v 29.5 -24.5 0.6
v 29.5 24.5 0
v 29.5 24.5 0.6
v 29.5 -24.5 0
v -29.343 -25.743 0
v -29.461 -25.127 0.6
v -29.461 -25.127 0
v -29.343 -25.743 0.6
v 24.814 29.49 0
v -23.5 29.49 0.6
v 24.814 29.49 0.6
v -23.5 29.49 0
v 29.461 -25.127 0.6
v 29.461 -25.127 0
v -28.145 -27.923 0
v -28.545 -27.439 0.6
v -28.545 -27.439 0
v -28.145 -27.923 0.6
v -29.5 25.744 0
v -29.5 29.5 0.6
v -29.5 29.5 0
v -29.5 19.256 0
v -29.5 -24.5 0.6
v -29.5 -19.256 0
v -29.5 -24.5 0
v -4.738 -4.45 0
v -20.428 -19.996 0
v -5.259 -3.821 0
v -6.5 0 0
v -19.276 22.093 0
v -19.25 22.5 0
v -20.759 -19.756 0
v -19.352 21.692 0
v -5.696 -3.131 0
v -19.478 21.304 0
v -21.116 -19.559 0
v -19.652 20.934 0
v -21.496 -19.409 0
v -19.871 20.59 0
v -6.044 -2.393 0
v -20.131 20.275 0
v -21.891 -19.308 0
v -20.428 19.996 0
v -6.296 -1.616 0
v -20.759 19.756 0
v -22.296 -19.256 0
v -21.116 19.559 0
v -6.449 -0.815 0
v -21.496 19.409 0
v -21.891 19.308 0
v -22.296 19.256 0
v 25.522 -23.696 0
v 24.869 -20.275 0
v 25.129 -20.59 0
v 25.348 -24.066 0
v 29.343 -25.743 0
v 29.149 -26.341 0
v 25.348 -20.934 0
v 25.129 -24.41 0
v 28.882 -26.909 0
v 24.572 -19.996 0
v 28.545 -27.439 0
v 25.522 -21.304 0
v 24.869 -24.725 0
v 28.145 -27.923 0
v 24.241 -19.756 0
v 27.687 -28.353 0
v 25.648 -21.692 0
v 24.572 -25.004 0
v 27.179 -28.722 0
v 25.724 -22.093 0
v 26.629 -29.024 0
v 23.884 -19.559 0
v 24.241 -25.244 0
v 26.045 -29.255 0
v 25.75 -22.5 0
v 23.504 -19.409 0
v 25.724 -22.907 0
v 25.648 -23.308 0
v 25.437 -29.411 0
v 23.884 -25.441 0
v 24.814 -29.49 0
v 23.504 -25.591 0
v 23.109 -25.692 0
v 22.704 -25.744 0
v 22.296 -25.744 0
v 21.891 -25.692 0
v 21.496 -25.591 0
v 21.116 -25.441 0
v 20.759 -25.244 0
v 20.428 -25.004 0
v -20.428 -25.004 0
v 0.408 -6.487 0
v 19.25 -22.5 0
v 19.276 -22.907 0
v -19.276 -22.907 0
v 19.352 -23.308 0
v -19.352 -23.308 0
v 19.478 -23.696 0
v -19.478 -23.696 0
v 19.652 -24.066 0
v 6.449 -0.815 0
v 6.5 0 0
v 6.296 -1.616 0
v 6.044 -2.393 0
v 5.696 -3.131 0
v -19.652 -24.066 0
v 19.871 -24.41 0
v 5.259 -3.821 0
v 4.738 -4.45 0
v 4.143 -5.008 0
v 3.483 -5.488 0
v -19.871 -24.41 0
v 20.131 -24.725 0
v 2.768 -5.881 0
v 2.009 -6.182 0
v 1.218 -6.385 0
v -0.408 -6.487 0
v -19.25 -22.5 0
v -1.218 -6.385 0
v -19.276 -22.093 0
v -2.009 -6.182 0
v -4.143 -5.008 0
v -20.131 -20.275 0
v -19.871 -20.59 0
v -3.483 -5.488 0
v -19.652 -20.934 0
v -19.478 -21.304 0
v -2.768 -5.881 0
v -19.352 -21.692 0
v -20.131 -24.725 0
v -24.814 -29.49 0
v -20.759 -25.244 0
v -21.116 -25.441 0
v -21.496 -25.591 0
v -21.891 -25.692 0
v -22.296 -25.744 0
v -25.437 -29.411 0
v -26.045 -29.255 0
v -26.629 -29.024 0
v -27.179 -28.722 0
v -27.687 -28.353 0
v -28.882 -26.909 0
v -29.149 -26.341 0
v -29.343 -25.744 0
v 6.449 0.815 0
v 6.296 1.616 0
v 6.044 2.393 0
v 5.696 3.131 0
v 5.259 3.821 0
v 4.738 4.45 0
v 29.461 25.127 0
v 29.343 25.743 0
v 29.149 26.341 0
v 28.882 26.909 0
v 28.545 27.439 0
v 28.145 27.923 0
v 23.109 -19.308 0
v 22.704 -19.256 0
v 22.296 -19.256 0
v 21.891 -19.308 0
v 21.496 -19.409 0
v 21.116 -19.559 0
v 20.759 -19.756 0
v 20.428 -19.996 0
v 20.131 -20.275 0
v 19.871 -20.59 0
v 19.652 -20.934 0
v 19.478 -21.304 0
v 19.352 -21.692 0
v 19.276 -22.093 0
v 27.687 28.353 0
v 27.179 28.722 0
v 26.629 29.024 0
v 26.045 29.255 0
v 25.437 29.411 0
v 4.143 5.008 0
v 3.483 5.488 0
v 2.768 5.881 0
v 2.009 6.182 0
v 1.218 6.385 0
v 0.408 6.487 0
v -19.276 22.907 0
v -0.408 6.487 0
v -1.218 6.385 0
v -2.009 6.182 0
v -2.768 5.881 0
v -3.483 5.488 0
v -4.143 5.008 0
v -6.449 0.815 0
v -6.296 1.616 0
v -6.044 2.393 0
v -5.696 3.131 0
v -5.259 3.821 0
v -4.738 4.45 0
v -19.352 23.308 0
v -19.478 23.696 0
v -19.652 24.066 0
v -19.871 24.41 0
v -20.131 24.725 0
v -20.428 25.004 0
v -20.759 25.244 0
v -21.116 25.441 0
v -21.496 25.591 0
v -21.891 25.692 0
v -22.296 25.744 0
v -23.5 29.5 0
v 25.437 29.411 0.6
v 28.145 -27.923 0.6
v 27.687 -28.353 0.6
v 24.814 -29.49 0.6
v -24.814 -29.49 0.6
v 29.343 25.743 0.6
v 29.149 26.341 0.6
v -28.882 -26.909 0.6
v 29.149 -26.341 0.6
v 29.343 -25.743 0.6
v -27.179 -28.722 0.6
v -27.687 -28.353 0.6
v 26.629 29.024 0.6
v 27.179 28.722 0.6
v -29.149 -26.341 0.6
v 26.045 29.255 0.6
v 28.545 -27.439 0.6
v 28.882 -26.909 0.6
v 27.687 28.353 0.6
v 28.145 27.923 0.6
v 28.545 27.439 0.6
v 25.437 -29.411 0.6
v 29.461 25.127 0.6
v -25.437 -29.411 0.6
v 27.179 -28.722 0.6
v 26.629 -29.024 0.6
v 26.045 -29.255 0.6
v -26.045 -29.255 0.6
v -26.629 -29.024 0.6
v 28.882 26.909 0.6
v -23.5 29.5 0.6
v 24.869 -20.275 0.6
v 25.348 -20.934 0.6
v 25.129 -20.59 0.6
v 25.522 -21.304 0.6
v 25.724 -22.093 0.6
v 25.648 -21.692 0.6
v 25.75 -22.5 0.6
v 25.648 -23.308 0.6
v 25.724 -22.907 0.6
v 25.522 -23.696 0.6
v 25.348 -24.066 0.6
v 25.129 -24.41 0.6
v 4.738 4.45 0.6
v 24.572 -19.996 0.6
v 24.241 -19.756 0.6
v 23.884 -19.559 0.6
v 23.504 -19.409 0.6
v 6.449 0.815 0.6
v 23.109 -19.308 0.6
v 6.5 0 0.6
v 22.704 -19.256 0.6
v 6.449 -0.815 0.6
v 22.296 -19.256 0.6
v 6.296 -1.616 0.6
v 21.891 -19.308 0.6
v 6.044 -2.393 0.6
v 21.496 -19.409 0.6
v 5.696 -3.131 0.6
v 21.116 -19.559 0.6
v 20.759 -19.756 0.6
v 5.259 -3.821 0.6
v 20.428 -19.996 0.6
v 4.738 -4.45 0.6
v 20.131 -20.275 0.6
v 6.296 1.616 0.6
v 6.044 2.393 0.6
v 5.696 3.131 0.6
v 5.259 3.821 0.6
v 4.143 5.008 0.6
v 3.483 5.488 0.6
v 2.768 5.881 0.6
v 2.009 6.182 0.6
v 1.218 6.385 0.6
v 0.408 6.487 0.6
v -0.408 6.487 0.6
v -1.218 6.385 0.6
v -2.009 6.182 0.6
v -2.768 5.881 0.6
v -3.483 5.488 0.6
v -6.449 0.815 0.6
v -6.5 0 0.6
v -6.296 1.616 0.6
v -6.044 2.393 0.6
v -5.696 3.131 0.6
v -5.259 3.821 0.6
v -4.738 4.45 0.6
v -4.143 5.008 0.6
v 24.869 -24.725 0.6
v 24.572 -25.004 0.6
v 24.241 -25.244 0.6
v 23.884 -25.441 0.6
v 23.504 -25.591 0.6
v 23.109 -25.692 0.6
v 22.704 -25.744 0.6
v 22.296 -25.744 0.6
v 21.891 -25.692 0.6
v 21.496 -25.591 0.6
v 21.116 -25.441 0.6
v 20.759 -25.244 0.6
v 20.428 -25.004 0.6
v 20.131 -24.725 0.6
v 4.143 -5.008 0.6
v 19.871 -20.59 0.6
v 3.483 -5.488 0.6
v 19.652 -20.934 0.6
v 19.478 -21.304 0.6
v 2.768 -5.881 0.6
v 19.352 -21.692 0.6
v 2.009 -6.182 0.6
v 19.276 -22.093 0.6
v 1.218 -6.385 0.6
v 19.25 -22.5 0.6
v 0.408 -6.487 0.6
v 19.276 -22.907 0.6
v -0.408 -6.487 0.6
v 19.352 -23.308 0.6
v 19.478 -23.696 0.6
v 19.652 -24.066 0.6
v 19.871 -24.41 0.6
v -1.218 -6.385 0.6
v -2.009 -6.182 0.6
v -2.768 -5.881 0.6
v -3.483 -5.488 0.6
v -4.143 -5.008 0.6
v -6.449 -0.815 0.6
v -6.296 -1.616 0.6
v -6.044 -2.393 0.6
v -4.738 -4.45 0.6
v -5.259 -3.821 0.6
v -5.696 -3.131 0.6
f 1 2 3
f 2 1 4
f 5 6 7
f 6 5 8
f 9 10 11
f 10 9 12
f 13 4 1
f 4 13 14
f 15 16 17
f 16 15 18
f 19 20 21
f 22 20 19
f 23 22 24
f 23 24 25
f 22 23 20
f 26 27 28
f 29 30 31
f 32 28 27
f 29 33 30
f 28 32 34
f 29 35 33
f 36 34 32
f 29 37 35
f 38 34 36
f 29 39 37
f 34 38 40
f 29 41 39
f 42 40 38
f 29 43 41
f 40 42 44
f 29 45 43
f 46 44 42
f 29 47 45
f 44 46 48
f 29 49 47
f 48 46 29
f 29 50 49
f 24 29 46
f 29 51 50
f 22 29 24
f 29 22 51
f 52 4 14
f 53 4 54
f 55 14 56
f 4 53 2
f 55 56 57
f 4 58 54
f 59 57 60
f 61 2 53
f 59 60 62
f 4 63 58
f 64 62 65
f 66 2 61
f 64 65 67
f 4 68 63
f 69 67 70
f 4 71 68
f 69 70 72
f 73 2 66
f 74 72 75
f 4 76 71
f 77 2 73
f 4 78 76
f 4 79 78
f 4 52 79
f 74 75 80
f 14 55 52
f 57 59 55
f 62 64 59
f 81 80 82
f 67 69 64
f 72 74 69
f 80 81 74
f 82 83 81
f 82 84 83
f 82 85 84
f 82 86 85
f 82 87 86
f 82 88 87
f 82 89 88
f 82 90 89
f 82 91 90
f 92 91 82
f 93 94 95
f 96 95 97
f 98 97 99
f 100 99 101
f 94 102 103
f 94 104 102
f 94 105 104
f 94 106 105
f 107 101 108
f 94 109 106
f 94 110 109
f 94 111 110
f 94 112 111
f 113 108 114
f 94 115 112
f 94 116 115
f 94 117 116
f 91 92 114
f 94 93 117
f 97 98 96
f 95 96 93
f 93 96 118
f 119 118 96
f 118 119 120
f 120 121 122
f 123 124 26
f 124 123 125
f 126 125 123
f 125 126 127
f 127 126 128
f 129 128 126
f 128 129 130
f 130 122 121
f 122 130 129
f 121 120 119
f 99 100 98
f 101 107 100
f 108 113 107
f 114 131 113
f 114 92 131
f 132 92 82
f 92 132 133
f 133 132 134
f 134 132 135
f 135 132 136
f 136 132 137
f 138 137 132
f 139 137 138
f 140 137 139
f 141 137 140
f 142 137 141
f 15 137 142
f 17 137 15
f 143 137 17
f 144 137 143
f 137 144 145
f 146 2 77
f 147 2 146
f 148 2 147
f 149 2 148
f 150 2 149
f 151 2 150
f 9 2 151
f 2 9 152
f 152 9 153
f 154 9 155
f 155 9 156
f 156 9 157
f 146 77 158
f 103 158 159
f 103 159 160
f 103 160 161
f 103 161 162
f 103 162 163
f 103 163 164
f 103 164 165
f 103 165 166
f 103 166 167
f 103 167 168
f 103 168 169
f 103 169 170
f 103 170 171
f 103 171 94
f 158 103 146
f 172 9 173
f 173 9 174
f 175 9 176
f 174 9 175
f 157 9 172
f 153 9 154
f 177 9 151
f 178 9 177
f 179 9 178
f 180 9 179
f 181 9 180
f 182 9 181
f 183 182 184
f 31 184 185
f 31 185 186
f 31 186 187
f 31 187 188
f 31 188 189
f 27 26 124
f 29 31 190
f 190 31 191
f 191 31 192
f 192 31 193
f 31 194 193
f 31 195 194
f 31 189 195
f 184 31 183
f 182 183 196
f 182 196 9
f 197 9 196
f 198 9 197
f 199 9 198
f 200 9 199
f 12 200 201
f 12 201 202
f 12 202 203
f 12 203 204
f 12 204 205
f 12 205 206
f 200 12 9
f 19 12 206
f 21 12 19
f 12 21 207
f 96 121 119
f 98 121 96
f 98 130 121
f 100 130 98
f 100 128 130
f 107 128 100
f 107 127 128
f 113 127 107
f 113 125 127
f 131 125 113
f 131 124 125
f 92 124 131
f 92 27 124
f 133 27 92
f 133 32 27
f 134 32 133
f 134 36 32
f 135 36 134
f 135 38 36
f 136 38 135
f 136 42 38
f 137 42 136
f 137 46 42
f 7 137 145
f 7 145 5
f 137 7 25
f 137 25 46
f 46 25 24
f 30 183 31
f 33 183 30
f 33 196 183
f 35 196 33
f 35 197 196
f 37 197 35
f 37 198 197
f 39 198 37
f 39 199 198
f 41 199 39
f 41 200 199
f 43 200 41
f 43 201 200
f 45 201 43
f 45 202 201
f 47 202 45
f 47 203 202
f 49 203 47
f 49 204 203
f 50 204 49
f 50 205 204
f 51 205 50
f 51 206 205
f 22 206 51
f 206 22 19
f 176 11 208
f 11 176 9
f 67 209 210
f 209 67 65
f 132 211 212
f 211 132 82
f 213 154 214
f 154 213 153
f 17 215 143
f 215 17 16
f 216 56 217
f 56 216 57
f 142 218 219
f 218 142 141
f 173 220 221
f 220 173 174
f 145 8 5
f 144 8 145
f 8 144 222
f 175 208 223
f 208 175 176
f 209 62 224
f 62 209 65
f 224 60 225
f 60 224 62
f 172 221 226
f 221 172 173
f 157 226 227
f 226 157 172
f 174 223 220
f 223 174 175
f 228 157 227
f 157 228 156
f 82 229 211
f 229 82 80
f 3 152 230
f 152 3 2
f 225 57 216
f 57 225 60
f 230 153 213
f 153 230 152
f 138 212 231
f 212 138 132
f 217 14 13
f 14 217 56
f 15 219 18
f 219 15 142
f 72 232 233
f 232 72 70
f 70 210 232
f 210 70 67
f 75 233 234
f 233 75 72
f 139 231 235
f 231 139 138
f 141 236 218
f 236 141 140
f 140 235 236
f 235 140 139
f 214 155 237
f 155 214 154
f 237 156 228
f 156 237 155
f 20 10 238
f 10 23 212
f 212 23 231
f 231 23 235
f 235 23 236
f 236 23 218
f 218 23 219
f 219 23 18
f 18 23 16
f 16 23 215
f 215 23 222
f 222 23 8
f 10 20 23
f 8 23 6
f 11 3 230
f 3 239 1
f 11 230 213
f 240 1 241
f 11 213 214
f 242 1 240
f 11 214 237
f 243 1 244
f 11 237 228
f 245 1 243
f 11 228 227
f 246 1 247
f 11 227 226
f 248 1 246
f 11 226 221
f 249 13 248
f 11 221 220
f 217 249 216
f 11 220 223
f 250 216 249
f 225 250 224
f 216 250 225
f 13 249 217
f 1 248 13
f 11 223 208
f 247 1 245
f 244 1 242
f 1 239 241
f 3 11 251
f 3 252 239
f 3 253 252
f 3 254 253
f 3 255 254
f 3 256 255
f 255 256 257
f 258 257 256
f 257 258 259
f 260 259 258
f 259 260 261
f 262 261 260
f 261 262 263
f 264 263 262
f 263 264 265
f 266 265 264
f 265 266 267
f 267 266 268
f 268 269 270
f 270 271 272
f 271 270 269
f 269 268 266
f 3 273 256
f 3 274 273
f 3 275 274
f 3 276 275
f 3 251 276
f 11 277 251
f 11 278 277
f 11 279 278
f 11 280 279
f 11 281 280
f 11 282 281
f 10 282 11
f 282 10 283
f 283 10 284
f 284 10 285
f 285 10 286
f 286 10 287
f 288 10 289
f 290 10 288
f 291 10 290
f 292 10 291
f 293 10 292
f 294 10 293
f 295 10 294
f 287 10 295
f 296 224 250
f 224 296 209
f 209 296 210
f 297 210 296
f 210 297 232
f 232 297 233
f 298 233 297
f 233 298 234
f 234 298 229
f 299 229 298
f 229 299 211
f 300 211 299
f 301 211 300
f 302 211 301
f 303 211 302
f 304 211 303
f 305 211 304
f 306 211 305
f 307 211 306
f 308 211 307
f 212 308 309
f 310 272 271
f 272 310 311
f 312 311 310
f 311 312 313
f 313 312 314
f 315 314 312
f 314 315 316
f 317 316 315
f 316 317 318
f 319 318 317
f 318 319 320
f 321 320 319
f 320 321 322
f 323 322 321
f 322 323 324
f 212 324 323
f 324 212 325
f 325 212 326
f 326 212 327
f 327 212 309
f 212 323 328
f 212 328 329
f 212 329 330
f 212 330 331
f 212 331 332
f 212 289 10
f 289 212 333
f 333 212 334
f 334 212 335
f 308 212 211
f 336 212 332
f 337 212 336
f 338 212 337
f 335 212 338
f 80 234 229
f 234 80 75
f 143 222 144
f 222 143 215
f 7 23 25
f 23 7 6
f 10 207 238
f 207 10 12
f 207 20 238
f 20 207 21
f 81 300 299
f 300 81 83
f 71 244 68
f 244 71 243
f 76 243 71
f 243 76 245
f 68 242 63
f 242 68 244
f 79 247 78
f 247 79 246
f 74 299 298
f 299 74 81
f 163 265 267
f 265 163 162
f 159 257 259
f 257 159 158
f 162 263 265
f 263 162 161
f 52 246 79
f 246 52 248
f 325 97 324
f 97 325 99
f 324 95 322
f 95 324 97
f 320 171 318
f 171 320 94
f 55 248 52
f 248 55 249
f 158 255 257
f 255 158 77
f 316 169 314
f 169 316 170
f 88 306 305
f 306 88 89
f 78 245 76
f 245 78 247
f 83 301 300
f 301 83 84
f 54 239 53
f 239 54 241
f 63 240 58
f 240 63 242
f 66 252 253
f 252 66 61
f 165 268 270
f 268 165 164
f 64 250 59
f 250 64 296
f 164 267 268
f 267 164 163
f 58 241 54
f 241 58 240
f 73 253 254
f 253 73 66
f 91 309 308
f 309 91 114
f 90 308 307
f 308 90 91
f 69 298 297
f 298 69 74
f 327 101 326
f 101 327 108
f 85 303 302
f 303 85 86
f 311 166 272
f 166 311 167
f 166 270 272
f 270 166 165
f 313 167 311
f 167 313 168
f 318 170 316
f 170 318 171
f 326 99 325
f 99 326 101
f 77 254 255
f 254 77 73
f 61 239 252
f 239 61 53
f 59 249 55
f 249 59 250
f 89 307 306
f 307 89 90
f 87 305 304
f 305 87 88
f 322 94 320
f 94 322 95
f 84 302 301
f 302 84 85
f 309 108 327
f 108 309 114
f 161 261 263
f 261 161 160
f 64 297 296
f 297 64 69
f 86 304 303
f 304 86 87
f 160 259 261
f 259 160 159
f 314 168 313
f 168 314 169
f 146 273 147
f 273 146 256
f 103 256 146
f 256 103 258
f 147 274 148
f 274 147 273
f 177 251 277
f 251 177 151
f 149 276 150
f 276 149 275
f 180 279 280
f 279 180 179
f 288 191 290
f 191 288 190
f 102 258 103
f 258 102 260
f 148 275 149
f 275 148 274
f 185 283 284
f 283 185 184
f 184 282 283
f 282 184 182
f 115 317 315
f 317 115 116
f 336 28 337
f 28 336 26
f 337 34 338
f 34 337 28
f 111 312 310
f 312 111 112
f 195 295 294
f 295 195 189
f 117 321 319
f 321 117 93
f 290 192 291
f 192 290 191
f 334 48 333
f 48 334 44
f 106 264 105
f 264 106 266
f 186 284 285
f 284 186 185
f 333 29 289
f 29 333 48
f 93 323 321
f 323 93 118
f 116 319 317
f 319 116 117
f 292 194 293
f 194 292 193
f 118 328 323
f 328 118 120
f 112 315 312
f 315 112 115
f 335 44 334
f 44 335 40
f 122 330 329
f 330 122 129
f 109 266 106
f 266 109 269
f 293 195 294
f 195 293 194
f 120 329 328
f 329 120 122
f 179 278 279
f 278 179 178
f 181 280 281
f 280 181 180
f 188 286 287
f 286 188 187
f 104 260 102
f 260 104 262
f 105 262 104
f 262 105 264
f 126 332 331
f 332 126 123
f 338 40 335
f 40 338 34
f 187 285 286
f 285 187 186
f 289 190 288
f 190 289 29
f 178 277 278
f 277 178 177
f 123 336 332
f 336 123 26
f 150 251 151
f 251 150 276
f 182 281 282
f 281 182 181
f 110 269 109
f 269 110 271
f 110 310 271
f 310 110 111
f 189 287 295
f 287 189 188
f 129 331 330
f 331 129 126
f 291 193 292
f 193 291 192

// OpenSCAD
$fn = 50;


difference() {
	union() {
		hull() {
			translate(v = [-24.5000000000, 24.5000000000, 0]) {
				cylinder(h = 0.6000000000, r = 5);
			}
			translate(v = [24.5000000000, 24.5000000000, 0]) {
				cylinder(h = 0.6000000000, r = 5);
			}
			translate(v = [-24.5000000000, -24.5000000000, 0]) {
				cylinder(h = 0.6000000000, r = 5);
			}
			translate(v = [24.5000000000, -24.5000000000, 0]) {
				cylinder(h = 0.6000000000, r = 5);
			}
		}
		translate(v = [-29.5000000000, 23.5000000000, 0]) {
			cube(size = [6, 6, 0.6000000000]);
		}
	}
	union() {
		translate(v = [-30.0000000000, -22.5000000000, -250.0000000000]) {
			rotate(a = [0, 0, 0]) {
				difference() {
					union() {
						hull() {
							translate(v = [7.5000000000, 0, 0]) {
								cylinder(h = 250, r = 3.2500000000, r1 = 3.2500000000, r2 = 3.2500000000);
							}
							translate(v = [-7.5000000000, 0, 0]) {
								cylinder(h = 250, r = 3.2500000000, r1 = 3.2500000000, r2 = 3.2500000000);
							}
						}
					}
					union();
				}
			}
		}
		translate(v = [-30.0000000000, 22.5000000000, -250.0000000000]) {
			rotate(a = [0, 0, 0]) {
				difference() {
					union() {
						hull() {
							translate(v = [7.5000000000, 0, 0]) {
								cylinder(h = 250, r = 3.2500000000, r1 = 3.2500000000, r2 = 3.2500000000);
							}
							translate(v = [-7.5000000000, 0, 0]) {
								cylinder(h = 250, r = 3.2500000000, r1 = 3.2500000000, r2 = 3.2500000000);
							}
						}
					}
					union();
				}
			}
		}
		translate(v = [22.5000000000, -22.5000000000, -50.0000000000]) {
			cylinder(h = 100, r = 3.2500000000);
		}
		cylinder(h = 0.6000000000, r = 6.5000000000);
	}
}
